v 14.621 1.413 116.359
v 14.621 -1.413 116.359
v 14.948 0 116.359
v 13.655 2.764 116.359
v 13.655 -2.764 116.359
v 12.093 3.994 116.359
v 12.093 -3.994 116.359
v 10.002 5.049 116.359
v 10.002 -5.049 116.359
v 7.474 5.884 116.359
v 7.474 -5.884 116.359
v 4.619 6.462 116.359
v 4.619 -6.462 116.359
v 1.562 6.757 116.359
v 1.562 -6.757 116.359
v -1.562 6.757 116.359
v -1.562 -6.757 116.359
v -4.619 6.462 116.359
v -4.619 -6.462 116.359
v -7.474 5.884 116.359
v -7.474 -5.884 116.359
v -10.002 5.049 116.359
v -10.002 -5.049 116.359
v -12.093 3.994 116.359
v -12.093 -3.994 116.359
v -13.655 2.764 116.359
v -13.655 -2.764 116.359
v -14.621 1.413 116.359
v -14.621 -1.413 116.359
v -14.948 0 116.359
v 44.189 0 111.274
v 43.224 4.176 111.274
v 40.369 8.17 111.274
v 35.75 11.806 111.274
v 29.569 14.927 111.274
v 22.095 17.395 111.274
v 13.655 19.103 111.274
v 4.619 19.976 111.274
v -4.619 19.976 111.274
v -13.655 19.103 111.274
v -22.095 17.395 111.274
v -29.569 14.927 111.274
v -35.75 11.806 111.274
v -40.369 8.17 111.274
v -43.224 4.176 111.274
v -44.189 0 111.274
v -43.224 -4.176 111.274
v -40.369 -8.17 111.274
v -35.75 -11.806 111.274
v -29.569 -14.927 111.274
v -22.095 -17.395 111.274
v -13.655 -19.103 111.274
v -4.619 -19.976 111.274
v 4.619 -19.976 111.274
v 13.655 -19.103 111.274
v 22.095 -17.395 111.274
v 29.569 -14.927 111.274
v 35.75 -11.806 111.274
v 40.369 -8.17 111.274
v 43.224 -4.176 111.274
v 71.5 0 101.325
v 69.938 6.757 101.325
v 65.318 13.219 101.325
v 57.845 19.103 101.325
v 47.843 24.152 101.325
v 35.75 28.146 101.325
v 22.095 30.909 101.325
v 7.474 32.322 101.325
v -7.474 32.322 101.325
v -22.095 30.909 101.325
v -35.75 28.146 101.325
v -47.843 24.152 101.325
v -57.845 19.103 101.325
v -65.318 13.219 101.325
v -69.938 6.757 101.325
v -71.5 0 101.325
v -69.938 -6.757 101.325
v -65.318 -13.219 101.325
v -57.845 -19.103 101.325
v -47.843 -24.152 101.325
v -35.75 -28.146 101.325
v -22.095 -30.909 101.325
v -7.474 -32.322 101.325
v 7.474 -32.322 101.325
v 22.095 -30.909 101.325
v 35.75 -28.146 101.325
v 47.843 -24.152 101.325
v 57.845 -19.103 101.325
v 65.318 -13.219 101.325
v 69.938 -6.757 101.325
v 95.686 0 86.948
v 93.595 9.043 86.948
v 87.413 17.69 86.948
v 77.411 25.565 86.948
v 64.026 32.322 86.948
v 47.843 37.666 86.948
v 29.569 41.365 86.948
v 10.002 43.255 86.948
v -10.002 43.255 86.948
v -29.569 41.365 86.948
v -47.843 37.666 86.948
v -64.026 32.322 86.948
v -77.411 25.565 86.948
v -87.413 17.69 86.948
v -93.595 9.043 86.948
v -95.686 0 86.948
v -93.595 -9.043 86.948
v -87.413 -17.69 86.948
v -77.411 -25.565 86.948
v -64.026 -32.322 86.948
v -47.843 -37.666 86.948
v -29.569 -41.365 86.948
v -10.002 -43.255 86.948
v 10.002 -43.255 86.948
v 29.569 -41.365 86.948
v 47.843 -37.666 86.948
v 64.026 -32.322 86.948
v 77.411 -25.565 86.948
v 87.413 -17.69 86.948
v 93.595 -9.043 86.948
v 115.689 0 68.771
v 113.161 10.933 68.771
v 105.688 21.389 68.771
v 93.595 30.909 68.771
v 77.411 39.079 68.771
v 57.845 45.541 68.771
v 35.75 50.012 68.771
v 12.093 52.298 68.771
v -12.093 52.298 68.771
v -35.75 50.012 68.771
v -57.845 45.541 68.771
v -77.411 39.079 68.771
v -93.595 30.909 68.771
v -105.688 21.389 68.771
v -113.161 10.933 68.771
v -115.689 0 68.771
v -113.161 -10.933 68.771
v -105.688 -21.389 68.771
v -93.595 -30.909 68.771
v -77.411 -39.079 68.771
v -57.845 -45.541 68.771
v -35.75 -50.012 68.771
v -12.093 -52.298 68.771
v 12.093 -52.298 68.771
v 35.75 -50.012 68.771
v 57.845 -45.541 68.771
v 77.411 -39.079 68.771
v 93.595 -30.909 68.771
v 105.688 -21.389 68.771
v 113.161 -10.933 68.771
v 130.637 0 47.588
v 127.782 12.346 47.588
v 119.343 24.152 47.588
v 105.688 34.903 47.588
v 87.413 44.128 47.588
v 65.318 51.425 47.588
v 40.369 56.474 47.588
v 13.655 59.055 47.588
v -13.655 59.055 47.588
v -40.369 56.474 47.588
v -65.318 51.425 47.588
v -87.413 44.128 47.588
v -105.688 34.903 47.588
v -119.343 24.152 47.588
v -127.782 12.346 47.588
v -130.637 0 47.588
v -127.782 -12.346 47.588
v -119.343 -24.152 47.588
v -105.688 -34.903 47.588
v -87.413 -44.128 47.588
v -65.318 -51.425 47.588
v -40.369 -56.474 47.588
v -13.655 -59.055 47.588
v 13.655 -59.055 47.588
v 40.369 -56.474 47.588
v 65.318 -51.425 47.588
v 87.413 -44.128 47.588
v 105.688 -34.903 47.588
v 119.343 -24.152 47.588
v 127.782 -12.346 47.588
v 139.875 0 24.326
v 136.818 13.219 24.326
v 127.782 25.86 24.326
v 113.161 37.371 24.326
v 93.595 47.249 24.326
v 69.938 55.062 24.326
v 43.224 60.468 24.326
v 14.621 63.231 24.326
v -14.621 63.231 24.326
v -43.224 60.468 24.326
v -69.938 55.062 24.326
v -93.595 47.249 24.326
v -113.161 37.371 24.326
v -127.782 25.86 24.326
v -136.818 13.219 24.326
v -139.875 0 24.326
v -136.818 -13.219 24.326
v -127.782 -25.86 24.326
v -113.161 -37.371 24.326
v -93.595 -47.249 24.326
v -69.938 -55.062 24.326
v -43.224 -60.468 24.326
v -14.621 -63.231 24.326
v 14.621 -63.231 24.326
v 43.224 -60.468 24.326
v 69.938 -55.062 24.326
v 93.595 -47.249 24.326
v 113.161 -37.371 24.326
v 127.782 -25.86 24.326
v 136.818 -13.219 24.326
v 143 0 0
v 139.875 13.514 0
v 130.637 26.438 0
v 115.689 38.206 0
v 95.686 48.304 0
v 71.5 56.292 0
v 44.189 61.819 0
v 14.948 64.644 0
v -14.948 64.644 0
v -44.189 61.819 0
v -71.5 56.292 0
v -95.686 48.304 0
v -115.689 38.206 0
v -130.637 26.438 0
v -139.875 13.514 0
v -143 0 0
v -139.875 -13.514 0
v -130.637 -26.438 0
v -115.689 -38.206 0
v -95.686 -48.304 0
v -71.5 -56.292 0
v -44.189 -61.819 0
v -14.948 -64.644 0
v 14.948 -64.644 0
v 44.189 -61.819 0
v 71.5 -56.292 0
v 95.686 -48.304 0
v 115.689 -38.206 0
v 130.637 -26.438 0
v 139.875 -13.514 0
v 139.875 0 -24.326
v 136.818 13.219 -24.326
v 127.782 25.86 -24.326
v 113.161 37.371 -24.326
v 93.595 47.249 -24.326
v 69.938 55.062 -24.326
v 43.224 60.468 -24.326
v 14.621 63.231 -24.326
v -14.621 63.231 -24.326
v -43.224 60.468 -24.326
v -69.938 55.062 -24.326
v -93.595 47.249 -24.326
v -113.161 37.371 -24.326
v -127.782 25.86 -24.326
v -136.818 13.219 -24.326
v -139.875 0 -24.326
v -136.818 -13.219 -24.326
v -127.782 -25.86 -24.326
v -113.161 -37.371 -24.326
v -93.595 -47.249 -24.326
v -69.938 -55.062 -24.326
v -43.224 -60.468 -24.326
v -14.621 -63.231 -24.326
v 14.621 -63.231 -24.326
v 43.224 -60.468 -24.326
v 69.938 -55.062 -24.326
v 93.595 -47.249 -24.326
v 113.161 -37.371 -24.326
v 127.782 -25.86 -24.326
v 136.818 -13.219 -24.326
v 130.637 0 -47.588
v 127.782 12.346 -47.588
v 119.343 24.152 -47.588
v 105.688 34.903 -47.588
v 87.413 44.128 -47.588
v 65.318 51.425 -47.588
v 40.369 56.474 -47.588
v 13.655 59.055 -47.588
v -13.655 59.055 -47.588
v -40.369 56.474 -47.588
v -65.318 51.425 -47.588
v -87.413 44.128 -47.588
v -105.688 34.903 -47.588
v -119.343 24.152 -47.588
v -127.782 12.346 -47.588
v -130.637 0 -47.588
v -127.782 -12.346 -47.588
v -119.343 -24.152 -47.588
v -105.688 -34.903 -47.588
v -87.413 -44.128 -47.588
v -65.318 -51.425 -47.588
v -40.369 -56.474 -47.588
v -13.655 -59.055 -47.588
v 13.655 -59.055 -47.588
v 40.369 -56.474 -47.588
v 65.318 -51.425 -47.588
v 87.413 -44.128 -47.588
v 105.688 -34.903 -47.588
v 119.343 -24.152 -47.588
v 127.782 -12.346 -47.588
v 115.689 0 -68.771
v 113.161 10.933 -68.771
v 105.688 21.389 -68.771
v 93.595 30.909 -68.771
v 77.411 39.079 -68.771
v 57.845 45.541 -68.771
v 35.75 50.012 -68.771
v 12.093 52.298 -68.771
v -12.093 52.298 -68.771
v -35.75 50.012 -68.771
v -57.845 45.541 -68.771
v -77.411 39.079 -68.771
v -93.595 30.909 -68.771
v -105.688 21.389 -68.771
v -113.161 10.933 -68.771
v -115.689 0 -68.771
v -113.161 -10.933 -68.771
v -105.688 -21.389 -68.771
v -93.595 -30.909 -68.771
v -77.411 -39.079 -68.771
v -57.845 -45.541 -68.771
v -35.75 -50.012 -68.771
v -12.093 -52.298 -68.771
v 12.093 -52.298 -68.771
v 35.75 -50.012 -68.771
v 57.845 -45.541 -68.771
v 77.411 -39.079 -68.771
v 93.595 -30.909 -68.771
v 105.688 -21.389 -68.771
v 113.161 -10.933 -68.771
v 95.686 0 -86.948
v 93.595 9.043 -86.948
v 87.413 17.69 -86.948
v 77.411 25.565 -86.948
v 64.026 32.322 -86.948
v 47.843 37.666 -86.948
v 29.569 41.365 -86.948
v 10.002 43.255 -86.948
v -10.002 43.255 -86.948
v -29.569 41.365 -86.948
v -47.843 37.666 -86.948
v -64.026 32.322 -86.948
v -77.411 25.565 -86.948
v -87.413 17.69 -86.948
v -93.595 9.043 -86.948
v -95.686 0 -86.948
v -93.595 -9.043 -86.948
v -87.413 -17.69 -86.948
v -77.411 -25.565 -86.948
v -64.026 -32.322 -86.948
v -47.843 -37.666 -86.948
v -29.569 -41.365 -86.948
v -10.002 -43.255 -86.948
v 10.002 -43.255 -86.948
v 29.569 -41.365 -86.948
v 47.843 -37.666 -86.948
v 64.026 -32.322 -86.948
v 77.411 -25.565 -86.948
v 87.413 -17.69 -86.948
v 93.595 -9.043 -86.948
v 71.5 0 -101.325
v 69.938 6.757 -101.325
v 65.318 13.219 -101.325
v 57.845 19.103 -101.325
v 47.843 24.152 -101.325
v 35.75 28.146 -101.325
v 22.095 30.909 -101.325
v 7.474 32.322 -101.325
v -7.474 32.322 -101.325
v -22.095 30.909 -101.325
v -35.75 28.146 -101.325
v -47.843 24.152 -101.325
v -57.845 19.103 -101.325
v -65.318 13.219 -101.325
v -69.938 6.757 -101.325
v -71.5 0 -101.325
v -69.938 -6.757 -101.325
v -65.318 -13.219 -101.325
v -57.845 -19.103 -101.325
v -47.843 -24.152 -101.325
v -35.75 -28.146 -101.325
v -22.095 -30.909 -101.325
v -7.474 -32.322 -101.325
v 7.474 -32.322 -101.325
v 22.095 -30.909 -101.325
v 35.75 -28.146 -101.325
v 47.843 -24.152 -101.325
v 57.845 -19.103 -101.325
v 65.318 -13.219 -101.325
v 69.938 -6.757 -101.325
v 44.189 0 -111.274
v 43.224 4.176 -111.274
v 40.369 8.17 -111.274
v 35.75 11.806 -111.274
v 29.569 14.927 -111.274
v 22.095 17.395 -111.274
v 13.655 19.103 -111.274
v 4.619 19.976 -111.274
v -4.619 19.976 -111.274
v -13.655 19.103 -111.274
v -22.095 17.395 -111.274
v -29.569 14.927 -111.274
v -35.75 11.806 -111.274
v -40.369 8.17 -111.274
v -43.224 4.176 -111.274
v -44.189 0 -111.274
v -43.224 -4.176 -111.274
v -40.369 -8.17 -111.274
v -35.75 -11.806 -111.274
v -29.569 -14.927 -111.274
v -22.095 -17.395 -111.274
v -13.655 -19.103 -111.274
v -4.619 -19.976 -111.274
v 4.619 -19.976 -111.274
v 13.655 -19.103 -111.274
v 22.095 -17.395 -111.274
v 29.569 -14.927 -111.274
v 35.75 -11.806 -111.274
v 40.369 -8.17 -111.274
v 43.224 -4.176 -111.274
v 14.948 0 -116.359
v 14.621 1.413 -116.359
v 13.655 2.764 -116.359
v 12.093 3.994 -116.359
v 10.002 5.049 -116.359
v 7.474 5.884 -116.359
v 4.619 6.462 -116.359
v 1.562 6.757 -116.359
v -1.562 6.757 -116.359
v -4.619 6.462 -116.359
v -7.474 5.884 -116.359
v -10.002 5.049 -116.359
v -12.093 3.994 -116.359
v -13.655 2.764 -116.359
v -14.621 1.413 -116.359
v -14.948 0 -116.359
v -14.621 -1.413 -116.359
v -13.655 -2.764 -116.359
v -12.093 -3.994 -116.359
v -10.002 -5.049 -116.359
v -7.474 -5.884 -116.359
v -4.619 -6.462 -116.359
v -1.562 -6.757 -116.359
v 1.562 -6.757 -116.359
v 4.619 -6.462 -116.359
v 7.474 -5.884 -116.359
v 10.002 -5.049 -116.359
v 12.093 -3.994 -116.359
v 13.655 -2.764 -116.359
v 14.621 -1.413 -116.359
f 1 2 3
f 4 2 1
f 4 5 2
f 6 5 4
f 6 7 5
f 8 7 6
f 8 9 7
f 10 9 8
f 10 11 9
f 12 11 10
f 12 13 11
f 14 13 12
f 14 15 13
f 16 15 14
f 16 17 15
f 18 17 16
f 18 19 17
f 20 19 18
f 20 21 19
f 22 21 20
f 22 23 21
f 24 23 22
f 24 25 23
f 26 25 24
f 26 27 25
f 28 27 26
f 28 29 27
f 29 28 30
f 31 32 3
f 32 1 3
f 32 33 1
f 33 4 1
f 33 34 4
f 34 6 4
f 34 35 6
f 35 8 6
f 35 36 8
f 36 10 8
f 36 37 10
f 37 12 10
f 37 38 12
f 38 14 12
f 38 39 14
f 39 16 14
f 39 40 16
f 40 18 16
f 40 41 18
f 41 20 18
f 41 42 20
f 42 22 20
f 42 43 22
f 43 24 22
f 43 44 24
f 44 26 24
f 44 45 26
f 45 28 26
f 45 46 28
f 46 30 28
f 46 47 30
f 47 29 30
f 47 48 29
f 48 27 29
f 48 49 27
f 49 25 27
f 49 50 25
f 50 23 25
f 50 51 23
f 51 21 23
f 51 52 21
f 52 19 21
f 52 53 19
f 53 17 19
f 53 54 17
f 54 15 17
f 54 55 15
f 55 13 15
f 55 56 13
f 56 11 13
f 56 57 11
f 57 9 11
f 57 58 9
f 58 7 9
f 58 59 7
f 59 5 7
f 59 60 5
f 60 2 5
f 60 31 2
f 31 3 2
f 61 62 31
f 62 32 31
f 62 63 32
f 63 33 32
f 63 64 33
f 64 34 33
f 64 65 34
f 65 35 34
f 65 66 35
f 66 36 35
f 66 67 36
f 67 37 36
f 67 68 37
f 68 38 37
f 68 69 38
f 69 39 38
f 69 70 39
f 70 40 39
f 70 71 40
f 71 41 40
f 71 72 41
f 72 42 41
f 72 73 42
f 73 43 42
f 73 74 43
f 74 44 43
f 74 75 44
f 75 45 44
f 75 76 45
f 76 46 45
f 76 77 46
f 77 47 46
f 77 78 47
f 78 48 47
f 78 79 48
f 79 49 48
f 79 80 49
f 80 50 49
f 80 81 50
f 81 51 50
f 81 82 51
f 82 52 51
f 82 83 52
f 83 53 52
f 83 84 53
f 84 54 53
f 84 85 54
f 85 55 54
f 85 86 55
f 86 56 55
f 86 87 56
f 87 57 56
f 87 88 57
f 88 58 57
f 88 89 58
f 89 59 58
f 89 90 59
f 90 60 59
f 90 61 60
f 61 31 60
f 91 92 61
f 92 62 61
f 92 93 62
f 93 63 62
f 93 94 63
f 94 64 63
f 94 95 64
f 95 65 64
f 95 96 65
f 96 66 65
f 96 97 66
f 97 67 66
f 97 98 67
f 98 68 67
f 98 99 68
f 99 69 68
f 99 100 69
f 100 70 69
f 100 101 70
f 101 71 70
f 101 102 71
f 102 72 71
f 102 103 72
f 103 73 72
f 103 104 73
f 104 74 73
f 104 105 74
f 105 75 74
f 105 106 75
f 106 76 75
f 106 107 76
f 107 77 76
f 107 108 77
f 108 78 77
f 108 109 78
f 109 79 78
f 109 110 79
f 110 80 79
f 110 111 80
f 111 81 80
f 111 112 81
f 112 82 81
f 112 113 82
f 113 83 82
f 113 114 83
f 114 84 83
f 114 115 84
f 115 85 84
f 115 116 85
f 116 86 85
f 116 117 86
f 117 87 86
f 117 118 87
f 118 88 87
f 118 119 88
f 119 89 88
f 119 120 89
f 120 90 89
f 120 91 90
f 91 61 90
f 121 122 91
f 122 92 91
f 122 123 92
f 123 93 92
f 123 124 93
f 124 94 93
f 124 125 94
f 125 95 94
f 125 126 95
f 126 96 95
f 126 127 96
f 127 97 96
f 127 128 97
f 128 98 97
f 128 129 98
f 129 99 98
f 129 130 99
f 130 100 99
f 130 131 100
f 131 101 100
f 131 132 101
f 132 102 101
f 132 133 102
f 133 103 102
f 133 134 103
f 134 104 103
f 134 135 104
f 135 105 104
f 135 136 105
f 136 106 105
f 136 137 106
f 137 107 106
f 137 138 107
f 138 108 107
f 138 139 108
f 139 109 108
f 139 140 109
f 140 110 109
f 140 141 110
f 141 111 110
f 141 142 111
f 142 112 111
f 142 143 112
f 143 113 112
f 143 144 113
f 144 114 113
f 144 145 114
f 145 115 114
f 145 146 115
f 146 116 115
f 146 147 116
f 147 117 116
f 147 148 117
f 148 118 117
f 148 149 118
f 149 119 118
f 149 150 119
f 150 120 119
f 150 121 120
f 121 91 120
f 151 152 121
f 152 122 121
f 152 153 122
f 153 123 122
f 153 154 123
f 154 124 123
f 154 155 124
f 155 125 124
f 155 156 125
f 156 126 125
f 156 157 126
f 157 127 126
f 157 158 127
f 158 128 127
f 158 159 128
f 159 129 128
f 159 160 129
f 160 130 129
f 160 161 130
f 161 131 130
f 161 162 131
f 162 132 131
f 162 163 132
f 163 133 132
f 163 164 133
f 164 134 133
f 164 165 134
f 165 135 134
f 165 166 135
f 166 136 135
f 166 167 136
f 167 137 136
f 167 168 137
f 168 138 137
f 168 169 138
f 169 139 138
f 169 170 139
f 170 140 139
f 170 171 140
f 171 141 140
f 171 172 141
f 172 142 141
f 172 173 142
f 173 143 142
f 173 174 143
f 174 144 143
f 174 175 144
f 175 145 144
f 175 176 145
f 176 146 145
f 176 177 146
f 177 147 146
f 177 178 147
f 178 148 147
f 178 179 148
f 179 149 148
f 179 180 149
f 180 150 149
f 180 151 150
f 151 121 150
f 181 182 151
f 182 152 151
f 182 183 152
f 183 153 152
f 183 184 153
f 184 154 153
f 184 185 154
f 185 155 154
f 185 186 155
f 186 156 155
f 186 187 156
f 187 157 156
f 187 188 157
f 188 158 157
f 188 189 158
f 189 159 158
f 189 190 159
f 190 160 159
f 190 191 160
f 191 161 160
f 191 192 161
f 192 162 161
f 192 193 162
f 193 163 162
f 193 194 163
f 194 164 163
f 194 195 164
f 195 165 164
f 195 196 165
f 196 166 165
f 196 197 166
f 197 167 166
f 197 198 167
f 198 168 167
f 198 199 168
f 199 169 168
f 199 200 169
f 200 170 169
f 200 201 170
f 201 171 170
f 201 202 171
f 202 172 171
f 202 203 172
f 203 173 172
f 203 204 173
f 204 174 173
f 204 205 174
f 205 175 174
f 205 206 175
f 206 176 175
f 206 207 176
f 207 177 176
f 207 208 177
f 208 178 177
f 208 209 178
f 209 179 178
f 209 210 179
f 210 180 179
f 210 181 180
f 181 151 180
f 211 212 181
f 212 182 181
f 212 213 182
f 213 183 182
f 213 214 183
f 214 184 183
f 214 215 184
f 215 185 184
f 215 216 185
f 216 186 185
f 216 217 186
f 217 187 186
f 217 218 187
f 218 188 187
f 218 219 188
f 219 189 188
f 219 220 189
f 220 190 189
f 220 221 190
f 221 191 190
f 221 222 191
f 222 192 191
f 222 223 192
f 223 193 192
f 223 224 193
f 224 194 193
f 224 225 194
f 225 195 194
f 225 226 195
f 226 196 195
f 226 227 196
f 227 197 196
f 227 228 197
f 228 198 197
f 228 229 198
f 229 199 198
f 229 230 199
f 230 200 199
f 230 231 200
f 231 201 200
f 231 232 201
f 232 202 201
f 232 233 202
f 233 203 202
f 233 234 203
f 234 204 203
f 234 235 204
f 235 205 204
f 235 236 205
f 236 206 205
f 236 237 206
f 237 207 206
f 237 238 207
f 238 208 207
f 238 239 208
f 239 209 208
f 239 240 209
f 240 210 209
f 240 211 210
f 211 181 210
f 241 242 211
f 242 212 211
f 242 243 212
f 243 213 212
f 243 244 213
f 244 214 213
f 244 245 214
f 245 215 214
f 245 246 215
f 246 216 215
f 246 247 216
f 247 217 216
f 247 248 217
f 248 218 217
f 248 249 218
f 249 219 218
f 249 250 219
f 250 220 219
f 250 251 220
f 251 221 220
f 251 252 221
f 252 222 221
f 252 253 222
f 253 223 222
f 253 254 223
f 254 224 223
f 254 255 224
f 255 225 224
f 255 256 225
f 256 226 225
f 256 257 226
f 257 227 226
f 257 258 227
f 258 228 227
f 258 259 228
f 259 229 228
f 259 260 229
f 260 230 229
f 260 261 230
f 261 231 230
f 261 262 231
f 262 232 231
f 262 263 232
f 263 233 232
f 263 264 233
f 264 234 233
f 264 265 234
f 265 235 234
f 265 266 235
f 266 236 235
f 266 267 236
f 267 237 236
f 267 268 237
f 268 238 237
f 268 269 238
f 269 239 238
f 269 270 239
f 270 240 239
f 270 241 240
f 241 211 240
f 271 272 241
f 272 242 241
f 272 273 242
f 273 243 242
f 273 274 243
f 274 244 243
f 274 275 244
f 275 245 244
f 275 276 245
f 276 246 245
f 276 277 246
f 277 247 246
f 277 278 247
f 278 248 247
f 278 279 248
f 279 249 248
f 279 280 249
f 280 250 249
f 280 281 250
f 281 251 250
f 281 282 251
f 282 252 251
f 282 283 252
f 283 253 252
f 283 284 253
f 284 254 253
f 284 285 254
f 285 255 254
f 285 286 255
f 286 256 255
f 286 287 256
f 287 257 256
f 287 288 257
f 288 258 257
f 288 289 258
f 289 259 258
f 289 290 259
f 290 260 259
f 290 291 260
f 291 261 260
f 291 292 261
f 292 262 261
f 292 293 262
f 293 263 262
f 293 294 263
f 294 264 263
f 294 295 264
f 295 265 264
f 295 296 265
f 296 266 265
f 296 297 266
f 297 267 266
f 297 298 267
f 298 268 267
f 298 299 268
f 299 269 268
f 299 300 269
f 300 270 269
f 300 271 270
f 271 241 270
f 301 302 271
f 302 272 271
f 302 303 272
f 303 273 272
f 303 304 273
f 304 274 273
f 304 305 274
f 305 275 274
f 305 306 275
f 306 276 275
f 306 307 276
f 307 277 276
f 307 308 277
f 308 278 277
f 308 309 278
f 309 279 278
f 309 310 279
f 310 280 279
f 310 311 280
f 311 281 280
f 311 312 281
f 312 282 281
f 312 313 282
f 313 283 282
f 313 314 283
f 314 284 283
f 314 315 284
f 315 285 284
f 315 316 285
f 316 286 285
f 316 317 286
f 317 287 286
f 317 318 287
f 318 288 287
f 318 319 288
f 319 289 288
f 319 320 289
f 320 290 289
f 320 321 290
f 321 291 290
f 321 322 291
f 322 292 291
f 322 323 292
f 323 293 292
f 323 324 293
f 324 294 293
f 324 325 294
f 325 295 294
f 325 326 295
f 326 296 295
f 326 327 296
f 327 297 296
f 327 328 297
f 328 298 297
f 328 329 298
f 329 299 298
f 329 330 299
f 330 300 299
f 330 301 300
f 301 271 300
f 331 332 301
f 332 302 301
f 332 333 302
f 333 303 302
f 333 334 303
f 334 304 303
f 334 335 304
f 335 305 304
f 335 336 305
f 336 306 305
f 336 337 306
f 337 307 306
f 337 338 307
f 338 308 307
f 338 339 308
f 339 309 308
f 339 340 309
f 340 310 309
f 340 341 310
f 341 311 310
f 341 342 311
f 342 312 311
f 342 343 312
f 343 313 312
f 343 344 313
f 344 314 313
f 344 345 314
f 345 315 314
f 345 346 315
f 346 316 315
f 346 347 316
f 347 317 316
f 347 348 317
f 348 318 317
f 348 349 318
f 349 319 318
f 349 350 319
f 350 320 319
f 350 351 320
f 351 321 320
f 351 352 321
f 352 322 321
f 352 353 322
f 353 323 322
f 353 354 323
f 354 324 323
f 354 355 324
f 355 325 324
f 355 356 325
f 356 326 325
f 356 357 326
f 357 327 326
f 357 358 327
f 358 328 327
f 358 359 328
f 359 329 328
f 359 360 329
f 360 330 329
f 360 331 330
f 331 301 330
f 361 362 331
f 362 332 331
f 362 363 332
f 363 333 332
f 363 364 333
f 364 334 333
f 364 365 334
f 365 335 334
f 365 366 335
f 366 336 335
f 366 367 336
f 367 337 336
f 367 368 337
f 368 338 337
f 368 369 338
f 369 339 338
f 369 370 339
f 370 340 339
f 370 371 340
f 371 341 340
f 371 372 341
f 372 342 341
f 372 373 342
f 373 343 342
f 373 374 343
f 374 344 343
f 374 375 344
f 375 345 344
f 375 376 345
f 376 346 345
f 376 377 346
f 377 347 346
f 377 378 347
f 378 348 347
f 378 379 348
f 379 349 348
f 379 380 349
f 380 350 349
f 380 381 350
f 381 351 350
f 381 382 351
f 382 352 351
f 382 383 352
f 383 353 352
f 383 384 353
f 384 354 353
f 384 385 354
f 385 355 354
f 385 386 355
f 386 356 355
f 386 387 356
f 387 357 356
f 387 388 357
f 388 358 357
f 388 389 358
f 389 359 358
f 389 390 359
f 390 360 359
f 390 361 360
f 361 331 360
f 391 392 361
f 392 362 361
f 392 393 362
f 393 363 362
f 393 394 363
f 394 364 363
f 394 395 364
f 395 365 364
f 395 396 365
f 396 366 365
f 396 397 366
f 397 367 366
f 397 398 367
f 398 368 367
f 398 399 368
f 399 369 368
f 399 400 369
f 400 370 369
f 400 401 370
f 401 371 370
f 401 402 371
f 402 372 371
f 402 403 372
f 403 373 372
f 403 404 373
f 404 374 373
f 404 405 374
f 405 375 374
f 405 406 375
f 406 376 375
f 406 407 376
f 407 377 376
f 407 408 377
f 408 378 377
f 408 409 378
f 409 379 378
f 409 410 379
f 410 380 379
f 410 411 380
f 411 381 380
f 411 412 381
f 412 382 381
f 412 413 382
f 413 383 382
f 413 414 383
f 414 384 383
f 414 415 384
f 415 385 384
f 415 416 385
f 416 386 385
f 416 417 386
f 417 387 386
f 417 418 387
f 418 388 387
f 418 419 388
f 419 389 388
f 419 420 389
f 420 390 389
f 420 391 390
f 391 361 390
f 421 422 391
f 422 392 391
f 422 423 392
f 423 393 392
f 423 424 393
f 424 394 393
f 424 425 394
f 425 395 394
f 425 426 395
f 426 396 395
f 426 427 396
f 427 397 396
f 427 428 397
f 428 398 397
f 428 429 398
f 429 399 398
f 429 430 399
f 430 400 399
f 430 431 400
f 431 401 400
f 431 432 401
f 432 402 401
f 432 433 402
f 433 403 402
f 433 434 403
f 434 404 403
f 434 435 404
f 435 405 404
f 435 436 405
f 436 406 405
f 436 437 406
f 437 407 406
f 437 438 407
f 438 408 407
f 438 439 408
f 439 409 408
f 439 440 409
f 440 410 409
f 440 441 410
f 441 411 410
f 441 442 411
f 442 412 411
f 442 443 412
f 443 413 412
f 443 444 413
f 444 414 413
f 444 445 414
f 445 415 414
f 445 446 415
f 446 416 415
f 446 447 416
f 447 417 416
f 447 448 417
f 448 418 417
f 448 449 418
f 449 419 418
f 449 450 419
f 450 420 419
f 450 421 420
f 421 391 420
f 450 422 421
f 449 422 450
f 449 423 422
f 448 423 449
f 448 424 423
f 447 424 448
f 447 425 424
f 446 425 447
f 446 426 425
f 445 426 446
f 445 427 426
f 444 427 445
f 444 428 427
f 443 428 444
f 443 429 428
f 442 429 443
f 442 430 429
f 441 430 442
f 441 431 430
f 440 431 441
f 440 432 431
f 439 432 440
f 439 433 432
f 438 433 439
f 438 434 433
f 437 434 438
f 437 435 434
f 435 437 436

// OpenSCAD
// Generated by SolidPython 1.0.1 on 2020-07-29 00:46:49


scale(v = [11, 5, 9]) {
	sphere(r = 13);
}
/***********************************************
*********      SolidPython code:      **********
************************************************
 
# import packages: SolidPython
from solid import *
from solid.utils import *
from itertools import chain, combinations, permutations


class Resize:

    def __init__(self, scad_file):
        self.scad_file = scad_file
        #self.scad_file = import_scad(scad_file)
        # cone/cylinder param:
        self.r1 = 0
        self.r2 = 0
        self.h = 0
        # rectangular prism param:
        self.w = 0
        self.l = 0
        # ellipse param:
        self.r = 0

    # import OpenScad code (file name corresponds to shape)


    # classify shape + parameters
    def assign(self, param1, param2, param3):
        if self.scad_file == 'cone.scad':
            self.r1 = param1
            self.r2 = param2
            self.h = param3
        elif self.scad_file == 'cylinder.scad':
            self.r1 = param1
            self.r2 = param2
            self.h = param3
        elif self.scad_file == 'rectangularPrism.scad':
            self.h = param1
            self.l = param2
            self.w = param3
        else:
            self.r = param1
            self.h = param2

    # resize parameters
    def iterate(self):
        x = range(3, 20, 2)
        i = 1
        if self.scad_file == 'cone.scad':
            tempList = list(permutations(x, 2))
            for temp in tempList:
                param1 = temp[0]
                param2 = temp[1]
                filepath = 'produced_scad_files/' + 'cone' + str(param1) + '_' + str(param2) + '_' + '.scad'
                scad_render_to_file(cylinder(h=param1, r1=param2, r2=0), filepath)

        elif self.scad_file == 'cylinder.scad':
            tempList = list(permutations(x, 3))
            for temp in tempList:
                param1 = temp[0]
                param2 = temp[1]
                filepath = 'produced_scad_files/' + 'cylinder' + str(param1) + '_' + str(param2) + '_' + '.scad'
                scad_render_to_file(cylinder(h=param1, r1=param2, r2=param2), filepath)

        elif self.scad_file == 'rectangularPrism.scad':
            tempList = list(permutations(x, 3))
            for temp in tempList:
                param1 = temp[0]
                param2 = temp[1]
                param3 = temp[2]
                filepath = 'produced_scad_files/' + 'rectangularPrism' + str(param1) + '_' + str(param2) + '_' + str(
                    param3) + '.scad'
                scad_render_to_file(cube(size=(param1, param2, param3)), filepath)

        elif self.scad_file == 'ellipse.scad':
            tempList = list(permutations(x, 4))
            for temp in tempList:
                param1 = temp[0]
                param2 = temp[1]
                param3 = temp[2]
                param4 = temp[3]
                filepath = 'produced_scad_files/' + 'ellipse' + str(param1) + '_' + str(param2) + '_' + str(param3) + '_' + str(param4) + '.scad'
                scad_render_to_file(scale([param1, param2, param3])(sphere(r=param4)), filepath)

    def render_to_scadfile(self):
        scad_render_to_file(scad, 'example.scad') 
 
************************************************/
